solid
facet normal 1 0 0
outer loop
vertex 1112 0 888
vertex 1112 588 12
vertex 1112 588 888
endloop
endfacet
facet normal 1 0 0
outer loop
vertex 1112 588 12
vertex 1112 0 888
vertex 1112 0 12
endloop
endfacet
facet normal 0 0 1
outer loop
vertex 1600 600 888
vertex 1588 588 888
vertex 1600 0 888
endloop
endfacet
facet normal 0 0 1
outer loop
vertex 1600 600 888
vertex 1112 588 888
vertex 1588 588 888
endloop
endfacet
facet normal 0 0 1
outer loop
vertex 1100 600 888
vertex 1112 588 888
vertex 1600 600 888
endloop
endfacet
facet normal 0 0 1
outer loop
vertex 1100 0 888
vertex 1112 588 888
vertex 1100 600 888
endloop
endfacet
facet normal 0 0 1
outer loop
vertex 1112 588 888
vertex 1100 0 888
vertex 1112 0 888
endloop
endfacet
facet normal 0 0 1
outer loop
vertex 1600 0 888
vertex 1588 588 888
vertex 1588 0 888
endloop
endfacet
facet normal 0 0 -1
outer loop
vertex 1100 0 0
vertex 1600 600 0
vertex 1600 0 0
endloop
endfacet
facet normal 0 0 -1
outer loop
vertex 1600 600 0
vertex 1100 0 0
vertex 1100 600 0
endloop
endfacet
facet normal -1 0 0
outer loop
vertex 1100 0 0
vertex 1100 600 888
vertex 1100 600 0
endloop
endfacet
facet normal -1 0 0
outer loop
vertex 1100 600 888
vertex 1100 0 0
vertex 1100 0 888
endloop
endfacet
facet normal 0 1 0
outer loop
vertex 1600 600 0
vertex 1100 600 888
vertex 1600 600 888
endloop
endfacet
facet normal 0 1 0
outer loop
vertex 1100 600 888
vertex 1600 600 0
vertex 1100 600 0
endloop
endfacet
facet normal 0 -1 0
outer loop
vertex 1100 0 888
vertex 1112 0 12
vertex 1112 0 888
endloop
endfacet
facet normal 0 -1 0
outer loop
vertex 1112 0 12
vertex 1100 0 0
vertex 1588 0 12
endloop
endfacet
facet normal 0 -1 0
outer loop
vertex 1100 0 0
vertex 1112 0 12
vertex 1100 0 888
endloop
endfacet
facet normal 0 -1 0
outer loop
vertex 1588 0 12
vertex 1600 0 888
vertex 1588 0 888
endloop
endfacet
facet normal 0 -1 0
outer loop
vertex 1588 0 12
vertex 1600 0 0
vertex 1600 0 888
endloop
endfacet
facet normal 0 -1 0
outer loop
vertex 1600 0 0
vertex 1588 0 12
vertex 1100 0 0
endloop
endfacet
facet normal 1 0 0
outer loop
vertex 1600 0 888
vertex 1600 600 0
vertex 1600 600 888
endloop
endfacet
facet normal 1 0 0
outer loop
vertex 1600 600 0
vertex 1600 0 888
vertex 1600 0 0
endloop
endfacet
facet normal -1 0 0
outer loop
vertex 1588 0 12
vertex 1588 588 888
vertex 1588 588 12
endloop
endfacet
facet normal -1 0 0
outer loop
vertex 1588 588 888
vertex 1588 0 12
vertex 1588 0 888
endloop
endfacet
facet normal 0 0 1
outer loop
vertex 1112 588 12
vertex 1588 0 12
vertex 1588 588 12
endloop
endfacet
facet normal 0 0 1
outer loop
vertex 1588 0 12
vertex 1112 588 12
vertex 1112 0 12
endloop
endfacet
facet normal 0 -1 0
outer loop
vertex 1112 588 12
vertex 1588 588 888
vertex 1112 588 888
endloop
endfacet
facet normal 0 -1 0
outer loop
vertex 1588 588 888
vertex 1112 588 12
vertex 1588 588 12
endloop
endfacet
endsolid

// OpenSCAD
// file: cabinet.scad
/*

    Cabinet
    
    By Anton Augustsson


*/

module cabinet (
    thickness,
    length,
    width,
    height
    ){
/*
    ---------- Local varibles ---------- 
*/



/*
    ---------- Code ---------- 
*/


union () {

// Left
translate([
    0,
    0,
    0]) 
cube(size = [
    thickness,
    width,
    height-thickness]);

// Right
translate([
    length-thickness,
    0,
    0]) 
cube(size = [
    thickness,
    width,
    height-thickness]);
    
// Bottom 
translate([
    thickness,
    0,
    0]) 
cube(size = [
    length
    -thickness*2,
    width-thickness,
    thickness]);

// Back
translate([
    thickness,
    width-thickness,
    0]) 
cube(size = [
    length
    -thickness*2,
    thickness,
    height-thickness]);
}}



/*
    ---------- Example ---------- 
*/


thickness = 12;

length = 600;
width  = 600;
height = 900;

cabinet (
    thickness,
    length,
    width,
    height
    );
// main file
/*

    Second Tird Section Right Table
    
    By Anton Augustsson


*/

use <cabinet.scad>;

module secondTirdSectionRightTable (
    plywoodThickness,
    lengthMiddleSection,
    lengthSecondSection,
    length,
    widthCabinet,
    widthCabinetDoor,
    widthTable,
    width,
    heightTable,
    heightCabinet,
    x,y,z
    ){

/*
    ---------- Local varibles ---------- 
*/

thickness = plywoodThickness;

length = lengthSecondSection+
        lengthTirdSection;
width  = widthTable+widthCabinet;
height = heightTable;


/*
    ---------- Code ---------- 
*/


translate([
	x,
	y,
	z,])

union () {

cabinet (
    thickness,
    length,
    width,
    height
    );

}}



/*
    ---------- Example ---------- 
*/


plywoodThickness = 12;

lengthMiddleSection = 600;
lengthSecondSection = lengthMiddleSection/2;
lengthTirdSection   = 200;
length=lengthMiddleSection
    +lengthSecondSection*2
    +lengthTirdSection*2;

widthCabinet     = 300;
widthCabinetDoor = widthCabinet/3;
widthTable       = 300;
width            = widthCabinet+widthTable;

heightTable   = 900;
heightCabinet = 900;


x=lengthMiddleSection+
    lengthSecondSection+lengthTirdSection;
y=0;
z=0;

secondTirdSectionRightTable (
    plywoodThickness,
    lengthMiddleSection,
    lengthSecondSection,
    length,
    widthCabinet,
    widthCabinetDoor,
    widthTable,
    width,
    heightTable,
    heightCabinet,
    x,y,z
    );
